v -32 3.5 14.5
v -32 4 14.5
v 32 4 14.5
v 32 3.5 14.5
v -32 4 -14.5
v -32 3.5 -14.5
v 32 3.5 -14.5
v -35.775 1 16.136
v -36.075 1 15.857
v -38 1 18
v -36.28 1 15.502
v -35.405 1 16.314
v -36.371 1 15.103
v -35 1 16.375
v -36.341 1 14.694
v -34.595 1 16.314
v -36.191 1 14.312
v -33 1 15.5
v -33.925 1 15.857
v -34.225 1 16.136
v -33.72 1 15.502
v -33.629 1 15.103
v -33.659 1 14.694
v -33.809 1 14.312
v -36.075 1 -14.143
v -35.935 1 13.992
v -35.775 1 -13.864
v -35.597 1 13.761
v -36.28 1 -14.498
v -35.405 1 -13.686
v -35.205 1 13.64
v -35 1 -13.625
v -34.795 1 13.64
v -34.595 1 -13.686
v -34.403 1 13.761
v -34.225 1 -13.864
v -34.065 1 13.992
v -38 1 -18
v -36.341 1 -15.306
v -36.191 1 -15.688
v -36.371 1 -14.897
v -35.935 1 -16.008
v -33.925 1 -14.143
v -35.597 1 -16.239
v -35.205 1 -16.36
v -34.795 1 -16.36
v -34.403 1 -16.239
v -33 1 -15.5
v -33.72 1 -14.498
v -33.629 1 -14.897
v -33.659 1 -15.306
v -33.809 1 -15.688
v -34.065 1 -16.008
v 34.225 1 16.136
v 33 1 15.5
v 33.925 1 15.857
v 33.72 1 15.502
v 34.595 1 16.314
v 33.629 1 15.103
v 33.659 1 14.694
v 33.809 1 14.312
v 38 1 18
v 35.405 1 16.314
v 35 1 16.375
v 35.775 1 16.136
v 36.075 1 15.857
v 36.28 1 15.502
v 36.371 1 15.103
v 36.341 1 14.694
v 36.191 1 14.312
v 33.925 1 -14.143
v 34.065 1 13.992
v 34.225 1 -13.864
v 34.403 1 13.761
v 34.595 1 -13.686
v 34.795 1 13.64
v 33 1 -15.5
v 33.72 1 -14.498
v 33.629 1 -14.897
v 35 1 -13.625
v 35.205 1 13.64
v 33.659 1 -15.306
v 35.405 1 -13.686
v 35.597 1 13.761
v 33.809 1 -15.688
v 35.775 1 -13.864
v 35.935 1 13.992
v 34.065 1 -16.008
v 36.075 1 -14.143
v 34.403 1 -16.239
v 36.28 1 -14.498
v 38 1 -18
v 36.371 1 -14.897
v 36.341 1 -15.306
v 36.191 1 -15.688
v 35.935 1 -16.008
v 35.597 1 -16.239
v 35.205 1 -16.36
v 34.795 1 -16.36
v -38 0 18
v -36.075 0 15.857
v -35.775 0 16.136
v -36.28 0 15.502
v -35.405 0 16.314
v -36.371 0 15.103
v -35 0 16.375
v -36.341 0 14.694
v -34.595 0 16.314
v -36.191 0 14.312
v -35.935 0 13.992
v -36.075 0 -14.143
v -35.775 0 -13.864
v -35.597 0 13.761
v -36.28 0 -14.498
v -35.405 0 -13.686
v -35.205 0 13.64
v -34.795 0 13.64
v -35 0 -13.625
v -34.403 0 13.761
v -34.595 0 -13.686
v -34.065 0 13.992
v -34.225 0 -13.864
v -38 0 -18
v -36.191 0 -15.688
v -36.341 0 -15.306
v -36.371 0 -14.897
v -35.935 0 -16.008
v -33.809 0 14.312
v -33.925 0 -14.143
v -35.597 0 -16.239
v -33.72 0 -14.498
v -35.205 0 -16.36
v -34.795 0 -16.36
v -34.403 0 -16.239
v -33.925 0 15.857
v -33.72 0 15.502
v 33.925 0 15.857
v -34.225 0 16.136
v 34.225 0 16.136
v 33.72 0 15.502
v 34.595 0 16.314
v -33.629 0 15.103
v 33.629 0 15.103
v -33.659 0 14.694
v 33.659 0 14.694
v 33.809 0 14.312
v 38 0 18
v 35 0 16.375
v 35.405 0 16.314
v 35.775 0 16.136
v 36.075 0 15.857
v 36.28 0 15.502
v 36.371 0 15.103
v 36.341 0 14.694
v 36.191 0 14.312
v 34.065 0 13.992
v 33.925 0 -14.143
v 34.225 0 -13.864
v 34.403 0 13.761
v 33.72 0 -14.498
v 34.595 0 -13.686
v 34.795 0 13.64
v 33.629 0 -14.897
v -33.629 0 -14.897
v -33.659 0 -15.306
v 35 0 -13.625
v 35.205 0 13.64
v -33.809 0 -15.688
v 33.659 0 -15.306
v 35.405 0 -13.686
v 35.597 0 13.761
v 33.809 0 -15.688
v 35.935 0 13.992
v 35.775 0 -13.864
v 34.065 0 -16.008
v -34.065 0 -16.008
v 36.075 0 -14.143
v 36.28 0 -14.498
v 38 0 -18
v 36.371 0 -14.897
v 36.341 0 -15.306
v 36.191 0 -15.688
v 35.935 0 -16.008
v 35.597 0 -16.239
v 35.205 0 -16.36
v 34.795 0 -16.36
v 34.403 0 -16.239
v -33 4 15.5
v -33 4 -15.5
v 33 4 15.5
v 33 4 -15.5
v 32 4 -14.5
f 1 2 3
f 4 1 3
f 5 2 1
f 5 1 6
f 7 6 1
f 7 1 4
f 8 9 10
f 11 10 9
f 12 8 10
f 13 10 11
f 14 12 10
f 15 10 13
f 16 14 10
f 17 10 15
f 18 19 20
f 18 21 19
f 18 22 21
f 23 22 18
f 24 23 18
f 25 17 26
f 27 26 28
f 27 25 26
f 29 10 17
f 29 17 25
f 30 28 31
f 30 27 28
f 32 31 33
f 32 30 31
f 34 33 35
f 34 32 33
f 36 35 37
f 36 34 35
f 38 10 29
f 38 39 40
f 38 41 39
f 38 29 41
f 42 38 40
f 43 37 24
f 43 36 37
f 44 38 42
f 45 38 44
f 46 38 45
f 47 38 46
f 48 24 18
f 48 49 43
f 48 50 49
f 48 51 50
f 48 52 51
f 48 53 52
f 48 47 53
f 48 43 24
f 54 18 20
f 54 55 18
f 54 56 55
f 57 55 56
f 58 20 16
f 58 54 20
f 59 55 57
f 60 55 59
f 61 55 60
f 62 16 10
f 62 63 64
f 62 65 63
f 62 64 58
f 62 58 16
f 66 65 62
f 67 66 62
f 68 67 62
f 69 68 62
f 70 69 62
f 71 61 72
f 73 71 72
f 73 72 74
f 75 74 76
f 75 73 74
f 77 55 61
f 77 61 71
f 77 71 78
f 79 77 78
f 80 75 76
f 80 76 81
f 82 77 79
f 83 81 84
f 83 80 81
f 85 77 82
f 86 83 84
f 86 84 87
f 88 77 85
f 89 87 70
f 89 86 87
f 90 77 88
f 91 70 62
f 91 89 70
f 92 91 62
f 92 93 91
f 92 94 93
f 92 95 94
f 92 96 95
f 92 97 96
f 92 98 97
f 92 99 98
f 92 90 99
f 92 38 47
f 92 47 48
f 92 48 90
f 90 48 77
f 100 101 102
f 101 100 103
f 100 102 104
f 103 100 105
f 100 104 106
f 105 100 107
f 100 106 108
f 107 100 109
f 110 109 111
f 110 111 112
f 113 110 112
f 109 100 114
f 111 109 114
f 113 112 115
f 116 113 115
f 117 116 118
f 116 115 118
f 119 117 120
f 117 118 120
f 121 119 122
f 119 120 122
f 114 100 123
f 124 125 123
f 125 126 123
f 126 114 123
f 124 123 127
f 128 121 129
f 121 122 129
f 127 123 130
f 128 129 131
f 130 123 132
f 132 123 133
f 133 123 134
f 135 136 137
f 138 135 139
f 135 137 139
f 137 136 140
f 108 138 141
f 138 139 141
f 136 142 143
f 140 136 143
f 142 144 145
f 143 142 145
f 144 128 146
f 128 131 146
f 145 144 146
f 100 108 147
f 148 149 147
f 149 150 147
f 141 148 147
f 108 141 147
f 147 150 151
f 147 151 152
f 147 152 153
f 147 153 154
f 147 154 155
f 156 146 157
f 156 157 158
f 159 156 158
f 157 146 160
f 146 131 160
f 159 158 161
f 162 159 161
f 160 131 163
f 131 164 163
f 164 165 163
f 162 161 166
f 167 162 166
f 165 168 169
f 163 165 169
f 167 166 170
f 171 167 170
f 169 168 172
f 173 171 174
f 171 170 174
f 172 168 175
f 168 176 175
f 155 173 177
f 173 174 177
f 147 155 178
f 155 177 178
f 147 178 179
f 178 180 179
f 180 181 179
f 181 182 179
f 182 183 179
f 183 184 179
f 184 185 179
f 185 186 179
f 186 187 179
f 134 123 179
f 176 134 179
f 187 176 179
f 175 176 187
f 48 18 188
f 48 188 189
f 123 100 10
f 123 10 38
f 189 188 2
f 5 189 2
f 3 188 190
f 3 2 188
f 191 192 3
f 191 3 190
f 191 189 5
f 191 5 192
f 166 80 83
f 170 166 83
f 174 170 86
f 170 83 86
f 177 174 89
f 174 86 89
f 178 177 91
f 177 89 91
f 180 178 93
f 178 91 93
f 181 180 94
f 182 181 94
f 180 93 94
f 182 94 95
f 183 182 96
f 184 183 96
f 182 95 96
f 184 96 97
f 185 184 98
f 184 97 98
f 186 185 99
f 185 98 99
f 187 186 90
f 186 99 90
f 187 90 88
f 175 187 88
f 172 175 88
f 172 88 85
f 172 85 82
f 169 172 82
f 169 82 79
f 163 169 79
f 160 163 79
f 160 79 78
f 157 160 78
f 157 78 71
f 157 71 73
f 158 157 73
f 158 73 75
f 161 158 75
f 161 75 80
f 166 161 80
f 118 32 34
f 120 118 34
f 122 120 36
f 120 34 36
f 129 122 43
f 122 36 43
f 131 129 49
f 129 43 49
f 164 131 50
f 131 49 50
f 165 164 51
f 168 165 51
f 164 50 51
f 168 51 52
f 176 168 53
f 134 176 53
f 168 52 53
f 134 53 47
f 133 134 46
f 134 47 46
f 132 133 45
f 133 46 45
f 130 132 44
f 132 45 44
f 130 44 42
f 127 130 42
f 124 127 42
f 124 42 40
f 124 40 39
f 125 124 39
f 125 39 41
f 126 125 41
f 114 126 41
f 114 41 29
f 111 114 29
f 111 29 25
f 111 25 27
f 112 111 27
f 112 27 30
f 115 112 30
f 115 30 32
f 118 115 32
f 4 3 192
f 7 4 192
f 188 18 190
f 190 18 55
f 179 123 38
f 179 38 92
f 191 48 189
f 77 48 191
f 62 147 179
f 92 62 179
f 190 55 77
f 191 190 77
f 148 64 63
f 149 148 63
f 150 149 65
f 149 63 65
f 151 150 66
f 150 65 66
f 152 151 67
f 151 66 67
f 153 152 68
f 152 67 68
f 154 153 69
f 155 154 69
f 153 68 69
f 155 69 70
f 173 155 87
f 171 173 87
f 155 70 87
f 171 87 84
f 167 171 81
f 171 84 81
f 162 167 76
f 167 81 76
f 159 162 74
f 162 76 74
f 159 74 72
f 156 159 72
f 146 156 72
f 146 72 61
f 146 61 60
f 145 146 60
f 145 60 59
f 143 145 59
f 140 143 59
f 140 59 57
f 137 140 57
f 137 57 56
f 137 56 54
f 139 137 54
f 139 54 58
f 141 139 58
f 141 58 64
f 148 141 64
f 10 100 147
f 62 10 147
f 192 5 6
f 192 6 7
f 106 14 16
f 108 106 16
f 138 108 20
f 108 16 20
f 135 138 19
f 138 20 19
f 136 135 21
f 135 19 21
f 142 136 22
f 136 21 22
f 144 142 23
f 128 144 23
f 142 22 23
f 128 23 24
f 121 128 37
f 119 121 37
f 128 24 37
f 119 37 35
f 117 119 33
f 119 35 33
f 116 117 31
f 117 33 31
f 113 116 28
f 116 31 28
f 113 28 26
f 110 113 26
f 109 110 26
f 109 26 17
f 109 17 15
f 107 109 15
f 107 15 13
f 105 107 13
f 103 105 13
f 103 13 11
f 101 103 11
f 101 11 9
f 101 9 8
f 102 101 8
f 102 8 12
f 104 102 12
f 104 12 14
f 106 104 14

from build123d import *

# Parameters (mm, degrees)
SKETCH1_W           = 76
SKETCH1_H           = 36
BOSS_EXTRUDE1_DEPTH = 1
SKETCH2_W           = 66
SKETCH2_H           = 31
BOSS_EXTRUDE2_DEPTH = 3
SKETCH3_W           = 64
SKETCH3_H           = 29
CUT_EXTRUDE1_DEPTH  = 0.5
SKETCH4_R           = 1.375
CUT_EXTRUDE2_DEPTH  = 5


with BuildPart() as part:
    # Sketch1 → Boss-Extrude1 (new body)
    with BuildSketch(Plane(origin=(0, 0, 0), x_dir=(1, 0, 0), z_dir=(0, 1, 0))):
        Rectangle(SKETCH1_W, SKETCH1_H)
    extrude(amount=BOSS_EXTRUDE1_DEPTH)

    # Sketch2 → Boss-Extrude2 (add)
    with BuildSketch(Plane(origin=(0, 1, 0), x_dir=(1, 0, 0), z_dir=(0, 1, 0))):
        Rectangle(SKETCH2_W, SKETCH2_H)
    extrude(amount=BOSS_EXTRUDE2_DEPTH)

    # Sketch3 → Cut-Extrude1 (cut)
    with BuildSketch(Plane(origin=(0, 4, 0), x_dir=(1, 0, 0), z_dir=(0, 1, 0))):
        Rectangle(SKETCH3_W, SKETCH3_H)
    extrude(amount=-CUT_EXTRUDE1_DEPTH, mode=Mode.SUBTRACT)

    # Sketch4 → Cut-Extrude2 (cut)
    with BuildSketch(Plane(origin=(0, 1, 0), x_dir=(1, 0, 0), z_dir=(0, 1, 0))):
        with Locations(Location((-35, 15, 0), (0, 0, 270))):
            Circle(SKETCH4_R)
        with Locations(Location((-35, -15, 0), (0, 0, 270))):
            Circle(SKETCH4_R)
        with Locations(Location((35, -15, 0), (0, 0, 270))):
            Circle(SKETCH4_R)
        with Locations(Location((35, 15, 0), (0, 0, 270))):
            Circle(SKETCH4_R)
    extrude(amount=-CUT_EXTRUDE2_DEPTH, mode=Mode.SUBTRACT)


solid = part.part
